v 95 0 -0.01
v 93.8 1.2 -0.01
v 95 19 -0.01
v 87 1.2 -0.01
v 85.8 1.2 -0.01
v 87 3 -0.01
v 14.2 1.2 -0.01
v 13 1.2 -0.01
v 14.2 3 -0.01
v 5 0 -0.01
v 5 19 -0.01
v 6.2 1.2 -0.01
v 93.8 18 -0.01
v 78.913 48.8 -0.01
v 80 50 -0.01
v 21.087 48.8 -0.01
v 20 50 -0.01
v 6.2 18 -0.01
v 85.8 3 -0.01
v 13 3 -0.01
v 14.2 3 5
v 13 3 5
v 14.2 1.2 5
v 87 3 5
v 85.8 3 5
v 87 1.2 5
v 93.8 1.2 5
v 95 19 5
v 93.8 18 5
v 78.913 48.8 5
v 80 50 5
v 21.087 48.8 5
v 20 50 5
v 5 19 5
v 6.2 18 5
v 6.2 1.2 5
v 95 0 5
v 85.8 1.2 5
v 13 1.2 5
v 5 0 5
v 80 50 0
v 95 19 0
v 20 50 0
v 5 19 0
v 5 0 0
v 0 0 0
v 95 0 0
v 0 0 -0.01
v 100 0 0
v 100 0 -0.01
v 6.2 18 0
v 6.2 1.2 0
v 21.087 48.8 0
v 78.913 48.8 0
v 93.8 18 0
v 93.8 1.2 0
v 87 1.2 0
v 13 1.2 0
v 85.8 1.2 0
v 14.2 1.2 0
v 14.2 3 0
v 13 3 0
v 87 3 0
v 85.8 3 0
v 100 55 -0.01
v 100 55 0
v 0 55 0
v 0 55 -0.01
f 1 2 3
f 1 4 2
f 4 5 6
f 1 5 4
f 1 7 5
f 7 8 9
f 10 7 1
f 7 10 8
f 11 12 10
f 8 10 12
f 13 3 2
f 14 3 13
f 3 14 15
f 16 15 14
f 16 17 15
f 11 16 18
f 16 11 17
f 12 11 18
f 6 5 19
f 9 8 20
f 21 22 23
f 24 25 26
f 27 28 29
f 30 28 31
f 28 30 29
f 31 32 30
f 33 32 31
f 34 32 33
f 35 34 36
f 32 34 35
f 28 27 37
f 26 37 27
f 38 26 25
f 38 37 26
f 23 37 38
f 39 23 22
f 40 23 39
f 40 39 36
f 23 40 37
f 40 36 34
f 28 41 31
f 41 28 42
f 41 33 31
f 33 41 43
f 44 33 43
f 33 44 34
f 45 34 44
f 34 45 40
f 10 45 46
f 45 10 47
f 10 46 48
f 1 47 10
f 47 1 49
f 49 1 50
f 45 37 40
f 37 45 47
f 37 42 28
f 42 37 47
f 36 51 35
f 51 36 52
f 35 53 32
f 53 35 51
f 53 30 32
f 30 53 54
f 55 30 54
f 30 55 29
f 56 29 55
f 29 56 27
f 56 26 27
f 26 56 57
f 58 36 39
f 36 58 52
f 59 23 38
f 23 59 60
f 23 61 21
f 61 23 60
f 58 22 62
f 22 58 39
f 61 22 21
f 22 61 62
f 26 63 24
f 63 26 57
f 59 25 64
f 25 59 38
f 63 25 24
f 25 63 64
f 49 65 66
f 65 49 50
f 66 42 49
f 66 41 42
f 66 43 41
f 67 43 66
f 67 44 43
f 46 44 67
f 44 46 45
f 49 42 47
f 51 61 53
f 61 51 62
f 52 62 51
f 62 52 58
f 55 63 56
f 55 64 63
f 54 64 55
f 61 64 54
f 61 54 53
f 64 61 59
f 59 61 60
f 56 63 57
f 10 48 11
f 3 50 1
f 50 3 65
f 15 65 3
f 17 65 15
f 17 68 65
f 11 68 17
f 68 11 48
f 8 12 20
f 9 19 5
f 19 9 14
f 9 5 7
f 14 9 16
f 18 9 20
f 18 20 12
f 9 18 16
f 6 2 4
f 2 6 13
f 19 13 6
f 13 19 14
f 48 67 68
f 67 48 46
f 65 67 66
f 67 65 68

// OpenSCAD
// file: ../Base/Boxes.scad
// Fischertechnik Box Foundation
// Pre-designed Boxes

use <Constants.scad>

include <PlacementOptions.scad>

box190Width = 190;
box190Depth = 130;
box130Width = 130;
box130Depth = 95;
boxUsageHeight = 33.9;
boxWallThickness = 2.4;
boxBaseThickness = 1.0;

// getBoxWallThickness()
// Gets the wall thickness of a Fischertechnik Box

function getBoxWallThickness() = boxWallThickness;

// Gets the usable height of a fischertechnik box
function getBoxUsageHeight() = boxUsageHeight;

// Gets the thickness of the Fischertechnik box base.
function getBoxBaseThickness() = boxBaseThickness;

// Gets the usable inner space of a Box 190 as an x/y-list
function getBox190Space() = [
    box190Width - 2*getBoxWallThickness(), 
    box190Depth - 2*getBoxWallThickness() ];

// Imports the Fischertechnik empty box 130x190 mm and places it at position 0,0
// 190x130 are the outer sizes, the inner space is slightly smaller. Use getBox190Space() to get the inner sizes.
// This module needs the STL file "Fischertechnik Box 130x190.stl" in the library path.
// The box is positioned that the usable inner space is at the 0,0,0 position. The

module Box190() {
    translate([-getBoxWallThickness(),-getBoxWallThickness(),-getBoxBaseThickness()])
        import("Fischertechnik Box 130x190.stl", convexity=3);
}

// Gets the usable inner space of a Box 130 as an x/y-list
function getBox130Space() = [
    box130Width - 2*getBoxWallThickness(), 
    box130Depth - 2*getBoxWallThickness() ];

// Imports the Fischertechnik empty box 95x130 mm and places it at position 0,0
// 190x130 are the outer sizes, the inner space is slightly smaller. Use getBox190Space() to get the inner sizes.
// This module needs the STL file "Fischertechnik Box 95x130.stl" in the library path.
// The box is positioned that the usable inner space is at the 0,0,0 position. The

module Box130() {
    translate([-getBoxWallThickness(),-getBoxWallThickness(),-getBoxBaseThickness()])
        import("Fischertechnik Box 95x130.stl", convexity=3);
}

// Creates a web at the specified box walls
// corner 0 = LowerLeft, 1 = UpperLeft, 2 = UpperRight, 3 = LowerRight
// side 0 = LeftOfCorner, 1 = RightOfCorner
// distance = Distance in mm from the corner
// box = inner width and depth of the box (default: Box 190)
// webWidth = length of the web (default is 3 mms)
// webThickness = thickness of the web (default is 1 mm)

module BoxWeb(corner, side, distance, box=getBox190Space(), webWidth=3, webThickness=1.0) {
    sink = getBoxWallThickness()/2;

    width = (corner % 2 == 0) ? 
            (side == LeftOfCorner ? webWidth : webThickness) :
            (side == LeftOfCorner ? webThickness : webWidth);

    depth = (corner % 2 == 0) ? 
            (side == RightOfCorner ? webWidth : webThickness) :
            (side == RightOfCorner ? webThickness : webWidth);
    
    xDiff = corner == LowerLeft ? 
                (side == LeftOfCorner ? -sink : distance) :
            (corner == UpperLeft ?                
                (side == LeftOfCorner ? distance : -sink) :
            (corner == UpperRight ?
                (side == LeftOfCorner ? box.x-webWidth+sink : box.x-distance-webThickness) :
                (side == LeftOfCorner ? box.x-distance-webThickness: box.x-webWidth+sink)));

    yDiff = corner == LowerLeft ? 
                (side == RightOfCorner ? -sink : distance) :
            (corner == UpperLeft ?
                (side == RightOfCorner ? box.y-distance : box.y-webWidth+sink) :
            (corner == UpperRight ?
                (side == RightOfCorner ? box.y-webWidth+sink : box.y-distance) :
                (side == RightOfCorner ? distance : -sink)));
    
    translate([xDiff, yDiff, -getExcess()])
        cube([width, depth, boxUsageHeight + 2*getExcess()]);
}
// file: ../Base/Rotation.scad
// Fischertechnik Box Foundation
// Geometry Helpers Rotation

include <PlacementOptions.scad>

// getRotatedSpace(space, rotation=NoRotation)
// Rotates the space dependent on the specified rotation

function getRotatedSpace(space, rotation=NoRotation) = [
    (rotation == Rotate90 || rotation == Rotate270) ? space.y : space.x,
    (rotation == Rotate90 || rotation == Rotate270) ? space.x : space.y
];

// Rotates the given space around the fixed left lower corner
// space = the space the children needs as width/depth list [width,depth]
// rotation = 0 Rotate0 degrees, 1 Rotate90 degrees, 2 Rotate180 degrees, 3 Rotate270 degrees (equivalent to -90)

module RotateFix(space, rotation=Rotate0) {
    dy = (rotation == Rotate0 || rotation == Rotate270) ? 0 :
        (rotation == Rotate90) ? space.x :
        space.y;
    dx = (rotation < Rotate180) ? 0 :
        (rotation == Rotate180) ? space.x :
        space.y;
    
    translate([dx, dy, 0])
        rotate([0, 0, rotations[rotation]])
            children();
}
// file: ../Base/Alignment.scad
// Fischertechnik Box Foundation
// Geometry Helpers Alignment

include <PlacementOptions.scad>

// getAlignedX(elementWidth, spaceWidth, align=AlignRight, offset=0)
// Gets the aligned X offset of an element with the given
// width in the given space.
// elementWidth = The width of the element to positon
// spaceWidth = The space where the element should be aligned
// align = 0 AlignLeft, 1 AlignCenter, 2 AlignRight
// offset = an optional offset from the aligned position. When
// aligned left or centered, then positive values are in X direction.
// When aligned right then positive values are in negative X direction.

function getAlignedX(elementWidth, spaceWidth, align=AlignRight, offset=0) =
    (align == AlignLeft) ?
        offset :
        ((align == AlignCenter) ?
        (spaceWidth - elementWidth)/2 + offset :
        spaceWidth - offset - elementWidth);

// getAlignedY(elementDepth, spaceDepth, align=AlignTop, offset=0)
// Gets the aligned Y offset of an element with the given
// depth in the given space.
// elementDepth = The depth of the element to positon
// spaceDepth = The space where the element should be aligned
// align = 0 AlignBottom, 1 AlignCenter, 2 AlignTop
// offset = an optional offset from the aligned position. When
// aligned bottom or centered, then positive values are in Y direction.
// When aligned top then positive values are in negative Y direction.

function getAlignedY(elementDepth, spaceDepth, align=AlignTop, offset=0) =
    (align == AlignBottom) ?
        offset :
        ((align == AlignCenter) ?
        (spaceDepth - elementDepth)/2 + offset :
        spaceDepth - offset - elementDepth);
// file: ../Base/PlacementOptions.scad
// Fischertechnik Box Foundation
// Placement Options

// Alignment
NoAlign = 0;
AlignLeft = 1;
AlignBottom = 2;
AlignCenter = 3;
AlignRight = 4;
AlignTop = 5;

// Element rotation degree steps
rotations = [0, -90, -180, -270];

// Rotation
NoRotation = 0;
Rotate0 = 0;
Rotate90 = 1;
Rotate180 = 2;
Rotate270 = 3;

// Docking (seen from above)
NoDock = -1;
DockLeft = 0;
DockTop = 1;
DockRight = 2;
DockCorner = 2;
DockBottom = 3;

// Web corners
LowerLeft = 0;
UpperLeft = 1;
UpperRight = 2;
LowerRight = 3;

// Web position relative to corner
LeftOfCorner = 0;
RightOfCorner = 1;
// file: ../Base/Placement.scad
// Fischertechnik Box Foundation
// Geometry Helpers Placement

use <Constants.scad>
use <Alignment.scad>
use <Rotation.scad>
use <Boxes.scad>

include <PlacementOptions.scad>

// Place(x=0, y=0, elementSpace=[0,0], alignX=AlignLeft, alignY=AlignBottom, rotation=Rotate0, boxSpace=getBox190Space())
// Places the child at the specified position
// y = Y-Position. This is a relative position when an X aligment is specified.
// x = X-Position. This is a relative position when an Y aligment is specified.
// elementSpace = space of the element to be placed [x,y]
// alignX = -1=NoAlign, 0 AlignLeft, 1 AlignCenter, 3 AlignRight (elementSpace and boxSpace required!)
// alignY = -1=NoAlign, 2 AlignBottom, 1 AlignCenter, 4 AlignTop (elementSpace and boxSpace required!)
// rotation = 0 Rotate0 0 degrees, 1 Rotate90 90 degrees, 
// 2 Rotate180 180 degrees, 3 Rotate270 270 degrees (equivalent to -90)
// boxSpace = Inner space of the box where the placement occurs [x,y] - default is Box 190x130 inner space

module Place(x=0, y=0, elementSpace=[0,0], 
  alignX=AlignLeft, alignY=AlignBottom, 
  rotation=NoRotation, boxSpace=getBox190Space()) {

    module Position(x, y, space, rotation=Rotate0) {
        translate([x, y, 0])
            RotateFix(space, rotation)
                children(0);
    }

    space = getRotatedSpace(elementSpace, rotation);
    alignedX = getAlignedX(space.x, boxSpace.x, alignX, x);
    alignedY = getAlignedY(space.y, boxSpace.y, alignY, y);
    Position(alignedX, alignedY, elementSpace, rotation)
        children(0);
}

// Center(space=getBox130Space(), elementSpace=[0,0])
// space = Space where the children is centered. For cylinder use centered=true and no elementSpace.
// elementSpace = space of the element to be centered [x,y]

module Center(space=getBox190Space(), elementSpace=[0,0]) {
    translate([(space.x - elementSpace.x) / 2, (space.y - elementSpace.y) / 2])
        children(0);
}

// CenterHorizontal(width=0, y=0, offset=0, space=getBox130Space())
// space = Space where the children is centered. For cylinder use centered=true and no elementSpace.
// elementSpace = space of the element to be centered [x,y]

module CenterHorizontal(width=0, y=0, offset=0, space=getBox190Space()) {
    translate([(space.x - width) / 2 + offset, y])
        children(0);
}

// CenterVertical(depth=0, x=0, offset=0, space=getBox130Space())
// space = Space where the children is centered. For cylinder use centered=true and no elementSpace.
// elementSpace = space of the element to be centered [x,y]

module CenterVerticalal(depth=0, x=0, offset=0, space=getBox190Space()) {
    translate([x, (space.y - depth) / 2 + offset])
        children(0);
}
// file: ../Base/Constants.scad
// Fischertechnik Box Foundation
// Constants

// Constant values necessary for multiple elements

// Base constants
dividerThickness = 1.2;
excess = 0.01;
fragments = 90;
tolerance = 0.8;

// Gets the thickness of a divider 
function getDividerThickness() = dividerThickness;

// Gets the excess that is used to merge walls into each other
function getExcess() = excess;

// Gets amount of fragments of a cylinder
function getFragments() = fragments;

// Gets the inner tolerance of a frame to each side
function getTolerance() = tolerance;


// Fischertechnik specific constants
axisDiameter = 4;
axisBottomDiameter = axisDiameter + 1;
standardEdgeDistance = 2.5;
standardWebDistance = 11.5;
standardCornerLength = 15;
tubeWallFactor = 1.6;

// Gets axis diameter
function getAxisDiameter() = axisDiameter;

// Gets axis bottom diameter for thicker part at the bottom
function getAxisBottomDiameter() = axisBottomDiameter;

// gets the standard distance to the wall of the box for dockable frames with webs
function getStandardEdgeDistance() = standardEdgeDistance;

// gets the standard distance of each web to the corner of the dockable frame
function getStandardWebDistance() = standardWebDistance;

// gets the standard length of the corner walls of a dockable frame
function getStandardCornerLength() = standardCornerLength;

// gets the wall thickness of a tube.
function getTubeWallThickness() = tubeWallFactor * getDividerThickness();
// main file
// Fischertechnik Box Library
// Frame for Driver's Cab Left and Right Side
// 38435, 38436

use <../Base/Constants.scad>
use <../ModelBase/Simple.scad>

spaceWidth = 100;
spaceDepth = 55;

// getFrameDriversCabLeftRightSpace()
// Gets the space the frame driver's cab left an right side needs as width (.x and .y as a list)

function getFrameDriversCabLeftRightSpace() = [spaceWidth, spaceDepth];

// FrameDriversCabLeftRight()
// Frame for Driver's Cab Left and Right Side
// 38435, 38436

module FrameDriversCabLeftRight() {
    Space ([spaceWidth, spaceDepth]);
    
    widthBottom = 90;
    widthTop = 60;
    depthBottom = 18;
    depthTop = 32;
    depthWeb = 3;
    height = 5;
    totalHeight = height + getExcess();
    
    xTopLeft = (widthBottom - widthTop) / 2;
    xTopRight = xTopLeft + widthTop;
    yTop = depthBottom + depthTop;
    xBottomRight = widthBottom;
    xBottomOffset = (spaceWidth - widthBottom) / 2;
    t = getDividerThickness();
    tX = (depthTop/sqrt(depthTop*depthTop + xTopLeft*xTopLeft)) * t;

    points = [ 
        [0, 0], 
        [0, depthBottom + 1 ], 
        [xTopLeft, yTop], 
        [xTopRight, yTop],
        [xBottomRight, depthBottom +1],
        [xBottomRight, 0],
        [t, t], 
        [t, depthBottom], 
        [xTopLeft+tX, yTop-t], 
        [xTopRight-tX, yTop-t],
        [xBottomRight-t, depthBottom],
        [xBottomRight-t, t],
        ];
    paths = [[0,1,2,3,4,5],[6,7,8,9,10,11]];

    webOffset1 = 8;
    webOffset2 = widthBottom - webOffset1 - getDividerThickness();

    translate([xBottomOffset, 0, -getExcess()]) {    
        linear_extrude(height = totalHeight)
            polygon (points, paths);
        translate([webOffset1, 0, 0])
            cube([getDividerThickness(), depthWeb, totalHeight]);
        translate([webOffset2, 0, 0])
            cube([getDividerThickness(), depthWeb, totalHeight]);        
    }
}

// Test
color("lightgray") {
FrameDriversCabLeftRight();
}
